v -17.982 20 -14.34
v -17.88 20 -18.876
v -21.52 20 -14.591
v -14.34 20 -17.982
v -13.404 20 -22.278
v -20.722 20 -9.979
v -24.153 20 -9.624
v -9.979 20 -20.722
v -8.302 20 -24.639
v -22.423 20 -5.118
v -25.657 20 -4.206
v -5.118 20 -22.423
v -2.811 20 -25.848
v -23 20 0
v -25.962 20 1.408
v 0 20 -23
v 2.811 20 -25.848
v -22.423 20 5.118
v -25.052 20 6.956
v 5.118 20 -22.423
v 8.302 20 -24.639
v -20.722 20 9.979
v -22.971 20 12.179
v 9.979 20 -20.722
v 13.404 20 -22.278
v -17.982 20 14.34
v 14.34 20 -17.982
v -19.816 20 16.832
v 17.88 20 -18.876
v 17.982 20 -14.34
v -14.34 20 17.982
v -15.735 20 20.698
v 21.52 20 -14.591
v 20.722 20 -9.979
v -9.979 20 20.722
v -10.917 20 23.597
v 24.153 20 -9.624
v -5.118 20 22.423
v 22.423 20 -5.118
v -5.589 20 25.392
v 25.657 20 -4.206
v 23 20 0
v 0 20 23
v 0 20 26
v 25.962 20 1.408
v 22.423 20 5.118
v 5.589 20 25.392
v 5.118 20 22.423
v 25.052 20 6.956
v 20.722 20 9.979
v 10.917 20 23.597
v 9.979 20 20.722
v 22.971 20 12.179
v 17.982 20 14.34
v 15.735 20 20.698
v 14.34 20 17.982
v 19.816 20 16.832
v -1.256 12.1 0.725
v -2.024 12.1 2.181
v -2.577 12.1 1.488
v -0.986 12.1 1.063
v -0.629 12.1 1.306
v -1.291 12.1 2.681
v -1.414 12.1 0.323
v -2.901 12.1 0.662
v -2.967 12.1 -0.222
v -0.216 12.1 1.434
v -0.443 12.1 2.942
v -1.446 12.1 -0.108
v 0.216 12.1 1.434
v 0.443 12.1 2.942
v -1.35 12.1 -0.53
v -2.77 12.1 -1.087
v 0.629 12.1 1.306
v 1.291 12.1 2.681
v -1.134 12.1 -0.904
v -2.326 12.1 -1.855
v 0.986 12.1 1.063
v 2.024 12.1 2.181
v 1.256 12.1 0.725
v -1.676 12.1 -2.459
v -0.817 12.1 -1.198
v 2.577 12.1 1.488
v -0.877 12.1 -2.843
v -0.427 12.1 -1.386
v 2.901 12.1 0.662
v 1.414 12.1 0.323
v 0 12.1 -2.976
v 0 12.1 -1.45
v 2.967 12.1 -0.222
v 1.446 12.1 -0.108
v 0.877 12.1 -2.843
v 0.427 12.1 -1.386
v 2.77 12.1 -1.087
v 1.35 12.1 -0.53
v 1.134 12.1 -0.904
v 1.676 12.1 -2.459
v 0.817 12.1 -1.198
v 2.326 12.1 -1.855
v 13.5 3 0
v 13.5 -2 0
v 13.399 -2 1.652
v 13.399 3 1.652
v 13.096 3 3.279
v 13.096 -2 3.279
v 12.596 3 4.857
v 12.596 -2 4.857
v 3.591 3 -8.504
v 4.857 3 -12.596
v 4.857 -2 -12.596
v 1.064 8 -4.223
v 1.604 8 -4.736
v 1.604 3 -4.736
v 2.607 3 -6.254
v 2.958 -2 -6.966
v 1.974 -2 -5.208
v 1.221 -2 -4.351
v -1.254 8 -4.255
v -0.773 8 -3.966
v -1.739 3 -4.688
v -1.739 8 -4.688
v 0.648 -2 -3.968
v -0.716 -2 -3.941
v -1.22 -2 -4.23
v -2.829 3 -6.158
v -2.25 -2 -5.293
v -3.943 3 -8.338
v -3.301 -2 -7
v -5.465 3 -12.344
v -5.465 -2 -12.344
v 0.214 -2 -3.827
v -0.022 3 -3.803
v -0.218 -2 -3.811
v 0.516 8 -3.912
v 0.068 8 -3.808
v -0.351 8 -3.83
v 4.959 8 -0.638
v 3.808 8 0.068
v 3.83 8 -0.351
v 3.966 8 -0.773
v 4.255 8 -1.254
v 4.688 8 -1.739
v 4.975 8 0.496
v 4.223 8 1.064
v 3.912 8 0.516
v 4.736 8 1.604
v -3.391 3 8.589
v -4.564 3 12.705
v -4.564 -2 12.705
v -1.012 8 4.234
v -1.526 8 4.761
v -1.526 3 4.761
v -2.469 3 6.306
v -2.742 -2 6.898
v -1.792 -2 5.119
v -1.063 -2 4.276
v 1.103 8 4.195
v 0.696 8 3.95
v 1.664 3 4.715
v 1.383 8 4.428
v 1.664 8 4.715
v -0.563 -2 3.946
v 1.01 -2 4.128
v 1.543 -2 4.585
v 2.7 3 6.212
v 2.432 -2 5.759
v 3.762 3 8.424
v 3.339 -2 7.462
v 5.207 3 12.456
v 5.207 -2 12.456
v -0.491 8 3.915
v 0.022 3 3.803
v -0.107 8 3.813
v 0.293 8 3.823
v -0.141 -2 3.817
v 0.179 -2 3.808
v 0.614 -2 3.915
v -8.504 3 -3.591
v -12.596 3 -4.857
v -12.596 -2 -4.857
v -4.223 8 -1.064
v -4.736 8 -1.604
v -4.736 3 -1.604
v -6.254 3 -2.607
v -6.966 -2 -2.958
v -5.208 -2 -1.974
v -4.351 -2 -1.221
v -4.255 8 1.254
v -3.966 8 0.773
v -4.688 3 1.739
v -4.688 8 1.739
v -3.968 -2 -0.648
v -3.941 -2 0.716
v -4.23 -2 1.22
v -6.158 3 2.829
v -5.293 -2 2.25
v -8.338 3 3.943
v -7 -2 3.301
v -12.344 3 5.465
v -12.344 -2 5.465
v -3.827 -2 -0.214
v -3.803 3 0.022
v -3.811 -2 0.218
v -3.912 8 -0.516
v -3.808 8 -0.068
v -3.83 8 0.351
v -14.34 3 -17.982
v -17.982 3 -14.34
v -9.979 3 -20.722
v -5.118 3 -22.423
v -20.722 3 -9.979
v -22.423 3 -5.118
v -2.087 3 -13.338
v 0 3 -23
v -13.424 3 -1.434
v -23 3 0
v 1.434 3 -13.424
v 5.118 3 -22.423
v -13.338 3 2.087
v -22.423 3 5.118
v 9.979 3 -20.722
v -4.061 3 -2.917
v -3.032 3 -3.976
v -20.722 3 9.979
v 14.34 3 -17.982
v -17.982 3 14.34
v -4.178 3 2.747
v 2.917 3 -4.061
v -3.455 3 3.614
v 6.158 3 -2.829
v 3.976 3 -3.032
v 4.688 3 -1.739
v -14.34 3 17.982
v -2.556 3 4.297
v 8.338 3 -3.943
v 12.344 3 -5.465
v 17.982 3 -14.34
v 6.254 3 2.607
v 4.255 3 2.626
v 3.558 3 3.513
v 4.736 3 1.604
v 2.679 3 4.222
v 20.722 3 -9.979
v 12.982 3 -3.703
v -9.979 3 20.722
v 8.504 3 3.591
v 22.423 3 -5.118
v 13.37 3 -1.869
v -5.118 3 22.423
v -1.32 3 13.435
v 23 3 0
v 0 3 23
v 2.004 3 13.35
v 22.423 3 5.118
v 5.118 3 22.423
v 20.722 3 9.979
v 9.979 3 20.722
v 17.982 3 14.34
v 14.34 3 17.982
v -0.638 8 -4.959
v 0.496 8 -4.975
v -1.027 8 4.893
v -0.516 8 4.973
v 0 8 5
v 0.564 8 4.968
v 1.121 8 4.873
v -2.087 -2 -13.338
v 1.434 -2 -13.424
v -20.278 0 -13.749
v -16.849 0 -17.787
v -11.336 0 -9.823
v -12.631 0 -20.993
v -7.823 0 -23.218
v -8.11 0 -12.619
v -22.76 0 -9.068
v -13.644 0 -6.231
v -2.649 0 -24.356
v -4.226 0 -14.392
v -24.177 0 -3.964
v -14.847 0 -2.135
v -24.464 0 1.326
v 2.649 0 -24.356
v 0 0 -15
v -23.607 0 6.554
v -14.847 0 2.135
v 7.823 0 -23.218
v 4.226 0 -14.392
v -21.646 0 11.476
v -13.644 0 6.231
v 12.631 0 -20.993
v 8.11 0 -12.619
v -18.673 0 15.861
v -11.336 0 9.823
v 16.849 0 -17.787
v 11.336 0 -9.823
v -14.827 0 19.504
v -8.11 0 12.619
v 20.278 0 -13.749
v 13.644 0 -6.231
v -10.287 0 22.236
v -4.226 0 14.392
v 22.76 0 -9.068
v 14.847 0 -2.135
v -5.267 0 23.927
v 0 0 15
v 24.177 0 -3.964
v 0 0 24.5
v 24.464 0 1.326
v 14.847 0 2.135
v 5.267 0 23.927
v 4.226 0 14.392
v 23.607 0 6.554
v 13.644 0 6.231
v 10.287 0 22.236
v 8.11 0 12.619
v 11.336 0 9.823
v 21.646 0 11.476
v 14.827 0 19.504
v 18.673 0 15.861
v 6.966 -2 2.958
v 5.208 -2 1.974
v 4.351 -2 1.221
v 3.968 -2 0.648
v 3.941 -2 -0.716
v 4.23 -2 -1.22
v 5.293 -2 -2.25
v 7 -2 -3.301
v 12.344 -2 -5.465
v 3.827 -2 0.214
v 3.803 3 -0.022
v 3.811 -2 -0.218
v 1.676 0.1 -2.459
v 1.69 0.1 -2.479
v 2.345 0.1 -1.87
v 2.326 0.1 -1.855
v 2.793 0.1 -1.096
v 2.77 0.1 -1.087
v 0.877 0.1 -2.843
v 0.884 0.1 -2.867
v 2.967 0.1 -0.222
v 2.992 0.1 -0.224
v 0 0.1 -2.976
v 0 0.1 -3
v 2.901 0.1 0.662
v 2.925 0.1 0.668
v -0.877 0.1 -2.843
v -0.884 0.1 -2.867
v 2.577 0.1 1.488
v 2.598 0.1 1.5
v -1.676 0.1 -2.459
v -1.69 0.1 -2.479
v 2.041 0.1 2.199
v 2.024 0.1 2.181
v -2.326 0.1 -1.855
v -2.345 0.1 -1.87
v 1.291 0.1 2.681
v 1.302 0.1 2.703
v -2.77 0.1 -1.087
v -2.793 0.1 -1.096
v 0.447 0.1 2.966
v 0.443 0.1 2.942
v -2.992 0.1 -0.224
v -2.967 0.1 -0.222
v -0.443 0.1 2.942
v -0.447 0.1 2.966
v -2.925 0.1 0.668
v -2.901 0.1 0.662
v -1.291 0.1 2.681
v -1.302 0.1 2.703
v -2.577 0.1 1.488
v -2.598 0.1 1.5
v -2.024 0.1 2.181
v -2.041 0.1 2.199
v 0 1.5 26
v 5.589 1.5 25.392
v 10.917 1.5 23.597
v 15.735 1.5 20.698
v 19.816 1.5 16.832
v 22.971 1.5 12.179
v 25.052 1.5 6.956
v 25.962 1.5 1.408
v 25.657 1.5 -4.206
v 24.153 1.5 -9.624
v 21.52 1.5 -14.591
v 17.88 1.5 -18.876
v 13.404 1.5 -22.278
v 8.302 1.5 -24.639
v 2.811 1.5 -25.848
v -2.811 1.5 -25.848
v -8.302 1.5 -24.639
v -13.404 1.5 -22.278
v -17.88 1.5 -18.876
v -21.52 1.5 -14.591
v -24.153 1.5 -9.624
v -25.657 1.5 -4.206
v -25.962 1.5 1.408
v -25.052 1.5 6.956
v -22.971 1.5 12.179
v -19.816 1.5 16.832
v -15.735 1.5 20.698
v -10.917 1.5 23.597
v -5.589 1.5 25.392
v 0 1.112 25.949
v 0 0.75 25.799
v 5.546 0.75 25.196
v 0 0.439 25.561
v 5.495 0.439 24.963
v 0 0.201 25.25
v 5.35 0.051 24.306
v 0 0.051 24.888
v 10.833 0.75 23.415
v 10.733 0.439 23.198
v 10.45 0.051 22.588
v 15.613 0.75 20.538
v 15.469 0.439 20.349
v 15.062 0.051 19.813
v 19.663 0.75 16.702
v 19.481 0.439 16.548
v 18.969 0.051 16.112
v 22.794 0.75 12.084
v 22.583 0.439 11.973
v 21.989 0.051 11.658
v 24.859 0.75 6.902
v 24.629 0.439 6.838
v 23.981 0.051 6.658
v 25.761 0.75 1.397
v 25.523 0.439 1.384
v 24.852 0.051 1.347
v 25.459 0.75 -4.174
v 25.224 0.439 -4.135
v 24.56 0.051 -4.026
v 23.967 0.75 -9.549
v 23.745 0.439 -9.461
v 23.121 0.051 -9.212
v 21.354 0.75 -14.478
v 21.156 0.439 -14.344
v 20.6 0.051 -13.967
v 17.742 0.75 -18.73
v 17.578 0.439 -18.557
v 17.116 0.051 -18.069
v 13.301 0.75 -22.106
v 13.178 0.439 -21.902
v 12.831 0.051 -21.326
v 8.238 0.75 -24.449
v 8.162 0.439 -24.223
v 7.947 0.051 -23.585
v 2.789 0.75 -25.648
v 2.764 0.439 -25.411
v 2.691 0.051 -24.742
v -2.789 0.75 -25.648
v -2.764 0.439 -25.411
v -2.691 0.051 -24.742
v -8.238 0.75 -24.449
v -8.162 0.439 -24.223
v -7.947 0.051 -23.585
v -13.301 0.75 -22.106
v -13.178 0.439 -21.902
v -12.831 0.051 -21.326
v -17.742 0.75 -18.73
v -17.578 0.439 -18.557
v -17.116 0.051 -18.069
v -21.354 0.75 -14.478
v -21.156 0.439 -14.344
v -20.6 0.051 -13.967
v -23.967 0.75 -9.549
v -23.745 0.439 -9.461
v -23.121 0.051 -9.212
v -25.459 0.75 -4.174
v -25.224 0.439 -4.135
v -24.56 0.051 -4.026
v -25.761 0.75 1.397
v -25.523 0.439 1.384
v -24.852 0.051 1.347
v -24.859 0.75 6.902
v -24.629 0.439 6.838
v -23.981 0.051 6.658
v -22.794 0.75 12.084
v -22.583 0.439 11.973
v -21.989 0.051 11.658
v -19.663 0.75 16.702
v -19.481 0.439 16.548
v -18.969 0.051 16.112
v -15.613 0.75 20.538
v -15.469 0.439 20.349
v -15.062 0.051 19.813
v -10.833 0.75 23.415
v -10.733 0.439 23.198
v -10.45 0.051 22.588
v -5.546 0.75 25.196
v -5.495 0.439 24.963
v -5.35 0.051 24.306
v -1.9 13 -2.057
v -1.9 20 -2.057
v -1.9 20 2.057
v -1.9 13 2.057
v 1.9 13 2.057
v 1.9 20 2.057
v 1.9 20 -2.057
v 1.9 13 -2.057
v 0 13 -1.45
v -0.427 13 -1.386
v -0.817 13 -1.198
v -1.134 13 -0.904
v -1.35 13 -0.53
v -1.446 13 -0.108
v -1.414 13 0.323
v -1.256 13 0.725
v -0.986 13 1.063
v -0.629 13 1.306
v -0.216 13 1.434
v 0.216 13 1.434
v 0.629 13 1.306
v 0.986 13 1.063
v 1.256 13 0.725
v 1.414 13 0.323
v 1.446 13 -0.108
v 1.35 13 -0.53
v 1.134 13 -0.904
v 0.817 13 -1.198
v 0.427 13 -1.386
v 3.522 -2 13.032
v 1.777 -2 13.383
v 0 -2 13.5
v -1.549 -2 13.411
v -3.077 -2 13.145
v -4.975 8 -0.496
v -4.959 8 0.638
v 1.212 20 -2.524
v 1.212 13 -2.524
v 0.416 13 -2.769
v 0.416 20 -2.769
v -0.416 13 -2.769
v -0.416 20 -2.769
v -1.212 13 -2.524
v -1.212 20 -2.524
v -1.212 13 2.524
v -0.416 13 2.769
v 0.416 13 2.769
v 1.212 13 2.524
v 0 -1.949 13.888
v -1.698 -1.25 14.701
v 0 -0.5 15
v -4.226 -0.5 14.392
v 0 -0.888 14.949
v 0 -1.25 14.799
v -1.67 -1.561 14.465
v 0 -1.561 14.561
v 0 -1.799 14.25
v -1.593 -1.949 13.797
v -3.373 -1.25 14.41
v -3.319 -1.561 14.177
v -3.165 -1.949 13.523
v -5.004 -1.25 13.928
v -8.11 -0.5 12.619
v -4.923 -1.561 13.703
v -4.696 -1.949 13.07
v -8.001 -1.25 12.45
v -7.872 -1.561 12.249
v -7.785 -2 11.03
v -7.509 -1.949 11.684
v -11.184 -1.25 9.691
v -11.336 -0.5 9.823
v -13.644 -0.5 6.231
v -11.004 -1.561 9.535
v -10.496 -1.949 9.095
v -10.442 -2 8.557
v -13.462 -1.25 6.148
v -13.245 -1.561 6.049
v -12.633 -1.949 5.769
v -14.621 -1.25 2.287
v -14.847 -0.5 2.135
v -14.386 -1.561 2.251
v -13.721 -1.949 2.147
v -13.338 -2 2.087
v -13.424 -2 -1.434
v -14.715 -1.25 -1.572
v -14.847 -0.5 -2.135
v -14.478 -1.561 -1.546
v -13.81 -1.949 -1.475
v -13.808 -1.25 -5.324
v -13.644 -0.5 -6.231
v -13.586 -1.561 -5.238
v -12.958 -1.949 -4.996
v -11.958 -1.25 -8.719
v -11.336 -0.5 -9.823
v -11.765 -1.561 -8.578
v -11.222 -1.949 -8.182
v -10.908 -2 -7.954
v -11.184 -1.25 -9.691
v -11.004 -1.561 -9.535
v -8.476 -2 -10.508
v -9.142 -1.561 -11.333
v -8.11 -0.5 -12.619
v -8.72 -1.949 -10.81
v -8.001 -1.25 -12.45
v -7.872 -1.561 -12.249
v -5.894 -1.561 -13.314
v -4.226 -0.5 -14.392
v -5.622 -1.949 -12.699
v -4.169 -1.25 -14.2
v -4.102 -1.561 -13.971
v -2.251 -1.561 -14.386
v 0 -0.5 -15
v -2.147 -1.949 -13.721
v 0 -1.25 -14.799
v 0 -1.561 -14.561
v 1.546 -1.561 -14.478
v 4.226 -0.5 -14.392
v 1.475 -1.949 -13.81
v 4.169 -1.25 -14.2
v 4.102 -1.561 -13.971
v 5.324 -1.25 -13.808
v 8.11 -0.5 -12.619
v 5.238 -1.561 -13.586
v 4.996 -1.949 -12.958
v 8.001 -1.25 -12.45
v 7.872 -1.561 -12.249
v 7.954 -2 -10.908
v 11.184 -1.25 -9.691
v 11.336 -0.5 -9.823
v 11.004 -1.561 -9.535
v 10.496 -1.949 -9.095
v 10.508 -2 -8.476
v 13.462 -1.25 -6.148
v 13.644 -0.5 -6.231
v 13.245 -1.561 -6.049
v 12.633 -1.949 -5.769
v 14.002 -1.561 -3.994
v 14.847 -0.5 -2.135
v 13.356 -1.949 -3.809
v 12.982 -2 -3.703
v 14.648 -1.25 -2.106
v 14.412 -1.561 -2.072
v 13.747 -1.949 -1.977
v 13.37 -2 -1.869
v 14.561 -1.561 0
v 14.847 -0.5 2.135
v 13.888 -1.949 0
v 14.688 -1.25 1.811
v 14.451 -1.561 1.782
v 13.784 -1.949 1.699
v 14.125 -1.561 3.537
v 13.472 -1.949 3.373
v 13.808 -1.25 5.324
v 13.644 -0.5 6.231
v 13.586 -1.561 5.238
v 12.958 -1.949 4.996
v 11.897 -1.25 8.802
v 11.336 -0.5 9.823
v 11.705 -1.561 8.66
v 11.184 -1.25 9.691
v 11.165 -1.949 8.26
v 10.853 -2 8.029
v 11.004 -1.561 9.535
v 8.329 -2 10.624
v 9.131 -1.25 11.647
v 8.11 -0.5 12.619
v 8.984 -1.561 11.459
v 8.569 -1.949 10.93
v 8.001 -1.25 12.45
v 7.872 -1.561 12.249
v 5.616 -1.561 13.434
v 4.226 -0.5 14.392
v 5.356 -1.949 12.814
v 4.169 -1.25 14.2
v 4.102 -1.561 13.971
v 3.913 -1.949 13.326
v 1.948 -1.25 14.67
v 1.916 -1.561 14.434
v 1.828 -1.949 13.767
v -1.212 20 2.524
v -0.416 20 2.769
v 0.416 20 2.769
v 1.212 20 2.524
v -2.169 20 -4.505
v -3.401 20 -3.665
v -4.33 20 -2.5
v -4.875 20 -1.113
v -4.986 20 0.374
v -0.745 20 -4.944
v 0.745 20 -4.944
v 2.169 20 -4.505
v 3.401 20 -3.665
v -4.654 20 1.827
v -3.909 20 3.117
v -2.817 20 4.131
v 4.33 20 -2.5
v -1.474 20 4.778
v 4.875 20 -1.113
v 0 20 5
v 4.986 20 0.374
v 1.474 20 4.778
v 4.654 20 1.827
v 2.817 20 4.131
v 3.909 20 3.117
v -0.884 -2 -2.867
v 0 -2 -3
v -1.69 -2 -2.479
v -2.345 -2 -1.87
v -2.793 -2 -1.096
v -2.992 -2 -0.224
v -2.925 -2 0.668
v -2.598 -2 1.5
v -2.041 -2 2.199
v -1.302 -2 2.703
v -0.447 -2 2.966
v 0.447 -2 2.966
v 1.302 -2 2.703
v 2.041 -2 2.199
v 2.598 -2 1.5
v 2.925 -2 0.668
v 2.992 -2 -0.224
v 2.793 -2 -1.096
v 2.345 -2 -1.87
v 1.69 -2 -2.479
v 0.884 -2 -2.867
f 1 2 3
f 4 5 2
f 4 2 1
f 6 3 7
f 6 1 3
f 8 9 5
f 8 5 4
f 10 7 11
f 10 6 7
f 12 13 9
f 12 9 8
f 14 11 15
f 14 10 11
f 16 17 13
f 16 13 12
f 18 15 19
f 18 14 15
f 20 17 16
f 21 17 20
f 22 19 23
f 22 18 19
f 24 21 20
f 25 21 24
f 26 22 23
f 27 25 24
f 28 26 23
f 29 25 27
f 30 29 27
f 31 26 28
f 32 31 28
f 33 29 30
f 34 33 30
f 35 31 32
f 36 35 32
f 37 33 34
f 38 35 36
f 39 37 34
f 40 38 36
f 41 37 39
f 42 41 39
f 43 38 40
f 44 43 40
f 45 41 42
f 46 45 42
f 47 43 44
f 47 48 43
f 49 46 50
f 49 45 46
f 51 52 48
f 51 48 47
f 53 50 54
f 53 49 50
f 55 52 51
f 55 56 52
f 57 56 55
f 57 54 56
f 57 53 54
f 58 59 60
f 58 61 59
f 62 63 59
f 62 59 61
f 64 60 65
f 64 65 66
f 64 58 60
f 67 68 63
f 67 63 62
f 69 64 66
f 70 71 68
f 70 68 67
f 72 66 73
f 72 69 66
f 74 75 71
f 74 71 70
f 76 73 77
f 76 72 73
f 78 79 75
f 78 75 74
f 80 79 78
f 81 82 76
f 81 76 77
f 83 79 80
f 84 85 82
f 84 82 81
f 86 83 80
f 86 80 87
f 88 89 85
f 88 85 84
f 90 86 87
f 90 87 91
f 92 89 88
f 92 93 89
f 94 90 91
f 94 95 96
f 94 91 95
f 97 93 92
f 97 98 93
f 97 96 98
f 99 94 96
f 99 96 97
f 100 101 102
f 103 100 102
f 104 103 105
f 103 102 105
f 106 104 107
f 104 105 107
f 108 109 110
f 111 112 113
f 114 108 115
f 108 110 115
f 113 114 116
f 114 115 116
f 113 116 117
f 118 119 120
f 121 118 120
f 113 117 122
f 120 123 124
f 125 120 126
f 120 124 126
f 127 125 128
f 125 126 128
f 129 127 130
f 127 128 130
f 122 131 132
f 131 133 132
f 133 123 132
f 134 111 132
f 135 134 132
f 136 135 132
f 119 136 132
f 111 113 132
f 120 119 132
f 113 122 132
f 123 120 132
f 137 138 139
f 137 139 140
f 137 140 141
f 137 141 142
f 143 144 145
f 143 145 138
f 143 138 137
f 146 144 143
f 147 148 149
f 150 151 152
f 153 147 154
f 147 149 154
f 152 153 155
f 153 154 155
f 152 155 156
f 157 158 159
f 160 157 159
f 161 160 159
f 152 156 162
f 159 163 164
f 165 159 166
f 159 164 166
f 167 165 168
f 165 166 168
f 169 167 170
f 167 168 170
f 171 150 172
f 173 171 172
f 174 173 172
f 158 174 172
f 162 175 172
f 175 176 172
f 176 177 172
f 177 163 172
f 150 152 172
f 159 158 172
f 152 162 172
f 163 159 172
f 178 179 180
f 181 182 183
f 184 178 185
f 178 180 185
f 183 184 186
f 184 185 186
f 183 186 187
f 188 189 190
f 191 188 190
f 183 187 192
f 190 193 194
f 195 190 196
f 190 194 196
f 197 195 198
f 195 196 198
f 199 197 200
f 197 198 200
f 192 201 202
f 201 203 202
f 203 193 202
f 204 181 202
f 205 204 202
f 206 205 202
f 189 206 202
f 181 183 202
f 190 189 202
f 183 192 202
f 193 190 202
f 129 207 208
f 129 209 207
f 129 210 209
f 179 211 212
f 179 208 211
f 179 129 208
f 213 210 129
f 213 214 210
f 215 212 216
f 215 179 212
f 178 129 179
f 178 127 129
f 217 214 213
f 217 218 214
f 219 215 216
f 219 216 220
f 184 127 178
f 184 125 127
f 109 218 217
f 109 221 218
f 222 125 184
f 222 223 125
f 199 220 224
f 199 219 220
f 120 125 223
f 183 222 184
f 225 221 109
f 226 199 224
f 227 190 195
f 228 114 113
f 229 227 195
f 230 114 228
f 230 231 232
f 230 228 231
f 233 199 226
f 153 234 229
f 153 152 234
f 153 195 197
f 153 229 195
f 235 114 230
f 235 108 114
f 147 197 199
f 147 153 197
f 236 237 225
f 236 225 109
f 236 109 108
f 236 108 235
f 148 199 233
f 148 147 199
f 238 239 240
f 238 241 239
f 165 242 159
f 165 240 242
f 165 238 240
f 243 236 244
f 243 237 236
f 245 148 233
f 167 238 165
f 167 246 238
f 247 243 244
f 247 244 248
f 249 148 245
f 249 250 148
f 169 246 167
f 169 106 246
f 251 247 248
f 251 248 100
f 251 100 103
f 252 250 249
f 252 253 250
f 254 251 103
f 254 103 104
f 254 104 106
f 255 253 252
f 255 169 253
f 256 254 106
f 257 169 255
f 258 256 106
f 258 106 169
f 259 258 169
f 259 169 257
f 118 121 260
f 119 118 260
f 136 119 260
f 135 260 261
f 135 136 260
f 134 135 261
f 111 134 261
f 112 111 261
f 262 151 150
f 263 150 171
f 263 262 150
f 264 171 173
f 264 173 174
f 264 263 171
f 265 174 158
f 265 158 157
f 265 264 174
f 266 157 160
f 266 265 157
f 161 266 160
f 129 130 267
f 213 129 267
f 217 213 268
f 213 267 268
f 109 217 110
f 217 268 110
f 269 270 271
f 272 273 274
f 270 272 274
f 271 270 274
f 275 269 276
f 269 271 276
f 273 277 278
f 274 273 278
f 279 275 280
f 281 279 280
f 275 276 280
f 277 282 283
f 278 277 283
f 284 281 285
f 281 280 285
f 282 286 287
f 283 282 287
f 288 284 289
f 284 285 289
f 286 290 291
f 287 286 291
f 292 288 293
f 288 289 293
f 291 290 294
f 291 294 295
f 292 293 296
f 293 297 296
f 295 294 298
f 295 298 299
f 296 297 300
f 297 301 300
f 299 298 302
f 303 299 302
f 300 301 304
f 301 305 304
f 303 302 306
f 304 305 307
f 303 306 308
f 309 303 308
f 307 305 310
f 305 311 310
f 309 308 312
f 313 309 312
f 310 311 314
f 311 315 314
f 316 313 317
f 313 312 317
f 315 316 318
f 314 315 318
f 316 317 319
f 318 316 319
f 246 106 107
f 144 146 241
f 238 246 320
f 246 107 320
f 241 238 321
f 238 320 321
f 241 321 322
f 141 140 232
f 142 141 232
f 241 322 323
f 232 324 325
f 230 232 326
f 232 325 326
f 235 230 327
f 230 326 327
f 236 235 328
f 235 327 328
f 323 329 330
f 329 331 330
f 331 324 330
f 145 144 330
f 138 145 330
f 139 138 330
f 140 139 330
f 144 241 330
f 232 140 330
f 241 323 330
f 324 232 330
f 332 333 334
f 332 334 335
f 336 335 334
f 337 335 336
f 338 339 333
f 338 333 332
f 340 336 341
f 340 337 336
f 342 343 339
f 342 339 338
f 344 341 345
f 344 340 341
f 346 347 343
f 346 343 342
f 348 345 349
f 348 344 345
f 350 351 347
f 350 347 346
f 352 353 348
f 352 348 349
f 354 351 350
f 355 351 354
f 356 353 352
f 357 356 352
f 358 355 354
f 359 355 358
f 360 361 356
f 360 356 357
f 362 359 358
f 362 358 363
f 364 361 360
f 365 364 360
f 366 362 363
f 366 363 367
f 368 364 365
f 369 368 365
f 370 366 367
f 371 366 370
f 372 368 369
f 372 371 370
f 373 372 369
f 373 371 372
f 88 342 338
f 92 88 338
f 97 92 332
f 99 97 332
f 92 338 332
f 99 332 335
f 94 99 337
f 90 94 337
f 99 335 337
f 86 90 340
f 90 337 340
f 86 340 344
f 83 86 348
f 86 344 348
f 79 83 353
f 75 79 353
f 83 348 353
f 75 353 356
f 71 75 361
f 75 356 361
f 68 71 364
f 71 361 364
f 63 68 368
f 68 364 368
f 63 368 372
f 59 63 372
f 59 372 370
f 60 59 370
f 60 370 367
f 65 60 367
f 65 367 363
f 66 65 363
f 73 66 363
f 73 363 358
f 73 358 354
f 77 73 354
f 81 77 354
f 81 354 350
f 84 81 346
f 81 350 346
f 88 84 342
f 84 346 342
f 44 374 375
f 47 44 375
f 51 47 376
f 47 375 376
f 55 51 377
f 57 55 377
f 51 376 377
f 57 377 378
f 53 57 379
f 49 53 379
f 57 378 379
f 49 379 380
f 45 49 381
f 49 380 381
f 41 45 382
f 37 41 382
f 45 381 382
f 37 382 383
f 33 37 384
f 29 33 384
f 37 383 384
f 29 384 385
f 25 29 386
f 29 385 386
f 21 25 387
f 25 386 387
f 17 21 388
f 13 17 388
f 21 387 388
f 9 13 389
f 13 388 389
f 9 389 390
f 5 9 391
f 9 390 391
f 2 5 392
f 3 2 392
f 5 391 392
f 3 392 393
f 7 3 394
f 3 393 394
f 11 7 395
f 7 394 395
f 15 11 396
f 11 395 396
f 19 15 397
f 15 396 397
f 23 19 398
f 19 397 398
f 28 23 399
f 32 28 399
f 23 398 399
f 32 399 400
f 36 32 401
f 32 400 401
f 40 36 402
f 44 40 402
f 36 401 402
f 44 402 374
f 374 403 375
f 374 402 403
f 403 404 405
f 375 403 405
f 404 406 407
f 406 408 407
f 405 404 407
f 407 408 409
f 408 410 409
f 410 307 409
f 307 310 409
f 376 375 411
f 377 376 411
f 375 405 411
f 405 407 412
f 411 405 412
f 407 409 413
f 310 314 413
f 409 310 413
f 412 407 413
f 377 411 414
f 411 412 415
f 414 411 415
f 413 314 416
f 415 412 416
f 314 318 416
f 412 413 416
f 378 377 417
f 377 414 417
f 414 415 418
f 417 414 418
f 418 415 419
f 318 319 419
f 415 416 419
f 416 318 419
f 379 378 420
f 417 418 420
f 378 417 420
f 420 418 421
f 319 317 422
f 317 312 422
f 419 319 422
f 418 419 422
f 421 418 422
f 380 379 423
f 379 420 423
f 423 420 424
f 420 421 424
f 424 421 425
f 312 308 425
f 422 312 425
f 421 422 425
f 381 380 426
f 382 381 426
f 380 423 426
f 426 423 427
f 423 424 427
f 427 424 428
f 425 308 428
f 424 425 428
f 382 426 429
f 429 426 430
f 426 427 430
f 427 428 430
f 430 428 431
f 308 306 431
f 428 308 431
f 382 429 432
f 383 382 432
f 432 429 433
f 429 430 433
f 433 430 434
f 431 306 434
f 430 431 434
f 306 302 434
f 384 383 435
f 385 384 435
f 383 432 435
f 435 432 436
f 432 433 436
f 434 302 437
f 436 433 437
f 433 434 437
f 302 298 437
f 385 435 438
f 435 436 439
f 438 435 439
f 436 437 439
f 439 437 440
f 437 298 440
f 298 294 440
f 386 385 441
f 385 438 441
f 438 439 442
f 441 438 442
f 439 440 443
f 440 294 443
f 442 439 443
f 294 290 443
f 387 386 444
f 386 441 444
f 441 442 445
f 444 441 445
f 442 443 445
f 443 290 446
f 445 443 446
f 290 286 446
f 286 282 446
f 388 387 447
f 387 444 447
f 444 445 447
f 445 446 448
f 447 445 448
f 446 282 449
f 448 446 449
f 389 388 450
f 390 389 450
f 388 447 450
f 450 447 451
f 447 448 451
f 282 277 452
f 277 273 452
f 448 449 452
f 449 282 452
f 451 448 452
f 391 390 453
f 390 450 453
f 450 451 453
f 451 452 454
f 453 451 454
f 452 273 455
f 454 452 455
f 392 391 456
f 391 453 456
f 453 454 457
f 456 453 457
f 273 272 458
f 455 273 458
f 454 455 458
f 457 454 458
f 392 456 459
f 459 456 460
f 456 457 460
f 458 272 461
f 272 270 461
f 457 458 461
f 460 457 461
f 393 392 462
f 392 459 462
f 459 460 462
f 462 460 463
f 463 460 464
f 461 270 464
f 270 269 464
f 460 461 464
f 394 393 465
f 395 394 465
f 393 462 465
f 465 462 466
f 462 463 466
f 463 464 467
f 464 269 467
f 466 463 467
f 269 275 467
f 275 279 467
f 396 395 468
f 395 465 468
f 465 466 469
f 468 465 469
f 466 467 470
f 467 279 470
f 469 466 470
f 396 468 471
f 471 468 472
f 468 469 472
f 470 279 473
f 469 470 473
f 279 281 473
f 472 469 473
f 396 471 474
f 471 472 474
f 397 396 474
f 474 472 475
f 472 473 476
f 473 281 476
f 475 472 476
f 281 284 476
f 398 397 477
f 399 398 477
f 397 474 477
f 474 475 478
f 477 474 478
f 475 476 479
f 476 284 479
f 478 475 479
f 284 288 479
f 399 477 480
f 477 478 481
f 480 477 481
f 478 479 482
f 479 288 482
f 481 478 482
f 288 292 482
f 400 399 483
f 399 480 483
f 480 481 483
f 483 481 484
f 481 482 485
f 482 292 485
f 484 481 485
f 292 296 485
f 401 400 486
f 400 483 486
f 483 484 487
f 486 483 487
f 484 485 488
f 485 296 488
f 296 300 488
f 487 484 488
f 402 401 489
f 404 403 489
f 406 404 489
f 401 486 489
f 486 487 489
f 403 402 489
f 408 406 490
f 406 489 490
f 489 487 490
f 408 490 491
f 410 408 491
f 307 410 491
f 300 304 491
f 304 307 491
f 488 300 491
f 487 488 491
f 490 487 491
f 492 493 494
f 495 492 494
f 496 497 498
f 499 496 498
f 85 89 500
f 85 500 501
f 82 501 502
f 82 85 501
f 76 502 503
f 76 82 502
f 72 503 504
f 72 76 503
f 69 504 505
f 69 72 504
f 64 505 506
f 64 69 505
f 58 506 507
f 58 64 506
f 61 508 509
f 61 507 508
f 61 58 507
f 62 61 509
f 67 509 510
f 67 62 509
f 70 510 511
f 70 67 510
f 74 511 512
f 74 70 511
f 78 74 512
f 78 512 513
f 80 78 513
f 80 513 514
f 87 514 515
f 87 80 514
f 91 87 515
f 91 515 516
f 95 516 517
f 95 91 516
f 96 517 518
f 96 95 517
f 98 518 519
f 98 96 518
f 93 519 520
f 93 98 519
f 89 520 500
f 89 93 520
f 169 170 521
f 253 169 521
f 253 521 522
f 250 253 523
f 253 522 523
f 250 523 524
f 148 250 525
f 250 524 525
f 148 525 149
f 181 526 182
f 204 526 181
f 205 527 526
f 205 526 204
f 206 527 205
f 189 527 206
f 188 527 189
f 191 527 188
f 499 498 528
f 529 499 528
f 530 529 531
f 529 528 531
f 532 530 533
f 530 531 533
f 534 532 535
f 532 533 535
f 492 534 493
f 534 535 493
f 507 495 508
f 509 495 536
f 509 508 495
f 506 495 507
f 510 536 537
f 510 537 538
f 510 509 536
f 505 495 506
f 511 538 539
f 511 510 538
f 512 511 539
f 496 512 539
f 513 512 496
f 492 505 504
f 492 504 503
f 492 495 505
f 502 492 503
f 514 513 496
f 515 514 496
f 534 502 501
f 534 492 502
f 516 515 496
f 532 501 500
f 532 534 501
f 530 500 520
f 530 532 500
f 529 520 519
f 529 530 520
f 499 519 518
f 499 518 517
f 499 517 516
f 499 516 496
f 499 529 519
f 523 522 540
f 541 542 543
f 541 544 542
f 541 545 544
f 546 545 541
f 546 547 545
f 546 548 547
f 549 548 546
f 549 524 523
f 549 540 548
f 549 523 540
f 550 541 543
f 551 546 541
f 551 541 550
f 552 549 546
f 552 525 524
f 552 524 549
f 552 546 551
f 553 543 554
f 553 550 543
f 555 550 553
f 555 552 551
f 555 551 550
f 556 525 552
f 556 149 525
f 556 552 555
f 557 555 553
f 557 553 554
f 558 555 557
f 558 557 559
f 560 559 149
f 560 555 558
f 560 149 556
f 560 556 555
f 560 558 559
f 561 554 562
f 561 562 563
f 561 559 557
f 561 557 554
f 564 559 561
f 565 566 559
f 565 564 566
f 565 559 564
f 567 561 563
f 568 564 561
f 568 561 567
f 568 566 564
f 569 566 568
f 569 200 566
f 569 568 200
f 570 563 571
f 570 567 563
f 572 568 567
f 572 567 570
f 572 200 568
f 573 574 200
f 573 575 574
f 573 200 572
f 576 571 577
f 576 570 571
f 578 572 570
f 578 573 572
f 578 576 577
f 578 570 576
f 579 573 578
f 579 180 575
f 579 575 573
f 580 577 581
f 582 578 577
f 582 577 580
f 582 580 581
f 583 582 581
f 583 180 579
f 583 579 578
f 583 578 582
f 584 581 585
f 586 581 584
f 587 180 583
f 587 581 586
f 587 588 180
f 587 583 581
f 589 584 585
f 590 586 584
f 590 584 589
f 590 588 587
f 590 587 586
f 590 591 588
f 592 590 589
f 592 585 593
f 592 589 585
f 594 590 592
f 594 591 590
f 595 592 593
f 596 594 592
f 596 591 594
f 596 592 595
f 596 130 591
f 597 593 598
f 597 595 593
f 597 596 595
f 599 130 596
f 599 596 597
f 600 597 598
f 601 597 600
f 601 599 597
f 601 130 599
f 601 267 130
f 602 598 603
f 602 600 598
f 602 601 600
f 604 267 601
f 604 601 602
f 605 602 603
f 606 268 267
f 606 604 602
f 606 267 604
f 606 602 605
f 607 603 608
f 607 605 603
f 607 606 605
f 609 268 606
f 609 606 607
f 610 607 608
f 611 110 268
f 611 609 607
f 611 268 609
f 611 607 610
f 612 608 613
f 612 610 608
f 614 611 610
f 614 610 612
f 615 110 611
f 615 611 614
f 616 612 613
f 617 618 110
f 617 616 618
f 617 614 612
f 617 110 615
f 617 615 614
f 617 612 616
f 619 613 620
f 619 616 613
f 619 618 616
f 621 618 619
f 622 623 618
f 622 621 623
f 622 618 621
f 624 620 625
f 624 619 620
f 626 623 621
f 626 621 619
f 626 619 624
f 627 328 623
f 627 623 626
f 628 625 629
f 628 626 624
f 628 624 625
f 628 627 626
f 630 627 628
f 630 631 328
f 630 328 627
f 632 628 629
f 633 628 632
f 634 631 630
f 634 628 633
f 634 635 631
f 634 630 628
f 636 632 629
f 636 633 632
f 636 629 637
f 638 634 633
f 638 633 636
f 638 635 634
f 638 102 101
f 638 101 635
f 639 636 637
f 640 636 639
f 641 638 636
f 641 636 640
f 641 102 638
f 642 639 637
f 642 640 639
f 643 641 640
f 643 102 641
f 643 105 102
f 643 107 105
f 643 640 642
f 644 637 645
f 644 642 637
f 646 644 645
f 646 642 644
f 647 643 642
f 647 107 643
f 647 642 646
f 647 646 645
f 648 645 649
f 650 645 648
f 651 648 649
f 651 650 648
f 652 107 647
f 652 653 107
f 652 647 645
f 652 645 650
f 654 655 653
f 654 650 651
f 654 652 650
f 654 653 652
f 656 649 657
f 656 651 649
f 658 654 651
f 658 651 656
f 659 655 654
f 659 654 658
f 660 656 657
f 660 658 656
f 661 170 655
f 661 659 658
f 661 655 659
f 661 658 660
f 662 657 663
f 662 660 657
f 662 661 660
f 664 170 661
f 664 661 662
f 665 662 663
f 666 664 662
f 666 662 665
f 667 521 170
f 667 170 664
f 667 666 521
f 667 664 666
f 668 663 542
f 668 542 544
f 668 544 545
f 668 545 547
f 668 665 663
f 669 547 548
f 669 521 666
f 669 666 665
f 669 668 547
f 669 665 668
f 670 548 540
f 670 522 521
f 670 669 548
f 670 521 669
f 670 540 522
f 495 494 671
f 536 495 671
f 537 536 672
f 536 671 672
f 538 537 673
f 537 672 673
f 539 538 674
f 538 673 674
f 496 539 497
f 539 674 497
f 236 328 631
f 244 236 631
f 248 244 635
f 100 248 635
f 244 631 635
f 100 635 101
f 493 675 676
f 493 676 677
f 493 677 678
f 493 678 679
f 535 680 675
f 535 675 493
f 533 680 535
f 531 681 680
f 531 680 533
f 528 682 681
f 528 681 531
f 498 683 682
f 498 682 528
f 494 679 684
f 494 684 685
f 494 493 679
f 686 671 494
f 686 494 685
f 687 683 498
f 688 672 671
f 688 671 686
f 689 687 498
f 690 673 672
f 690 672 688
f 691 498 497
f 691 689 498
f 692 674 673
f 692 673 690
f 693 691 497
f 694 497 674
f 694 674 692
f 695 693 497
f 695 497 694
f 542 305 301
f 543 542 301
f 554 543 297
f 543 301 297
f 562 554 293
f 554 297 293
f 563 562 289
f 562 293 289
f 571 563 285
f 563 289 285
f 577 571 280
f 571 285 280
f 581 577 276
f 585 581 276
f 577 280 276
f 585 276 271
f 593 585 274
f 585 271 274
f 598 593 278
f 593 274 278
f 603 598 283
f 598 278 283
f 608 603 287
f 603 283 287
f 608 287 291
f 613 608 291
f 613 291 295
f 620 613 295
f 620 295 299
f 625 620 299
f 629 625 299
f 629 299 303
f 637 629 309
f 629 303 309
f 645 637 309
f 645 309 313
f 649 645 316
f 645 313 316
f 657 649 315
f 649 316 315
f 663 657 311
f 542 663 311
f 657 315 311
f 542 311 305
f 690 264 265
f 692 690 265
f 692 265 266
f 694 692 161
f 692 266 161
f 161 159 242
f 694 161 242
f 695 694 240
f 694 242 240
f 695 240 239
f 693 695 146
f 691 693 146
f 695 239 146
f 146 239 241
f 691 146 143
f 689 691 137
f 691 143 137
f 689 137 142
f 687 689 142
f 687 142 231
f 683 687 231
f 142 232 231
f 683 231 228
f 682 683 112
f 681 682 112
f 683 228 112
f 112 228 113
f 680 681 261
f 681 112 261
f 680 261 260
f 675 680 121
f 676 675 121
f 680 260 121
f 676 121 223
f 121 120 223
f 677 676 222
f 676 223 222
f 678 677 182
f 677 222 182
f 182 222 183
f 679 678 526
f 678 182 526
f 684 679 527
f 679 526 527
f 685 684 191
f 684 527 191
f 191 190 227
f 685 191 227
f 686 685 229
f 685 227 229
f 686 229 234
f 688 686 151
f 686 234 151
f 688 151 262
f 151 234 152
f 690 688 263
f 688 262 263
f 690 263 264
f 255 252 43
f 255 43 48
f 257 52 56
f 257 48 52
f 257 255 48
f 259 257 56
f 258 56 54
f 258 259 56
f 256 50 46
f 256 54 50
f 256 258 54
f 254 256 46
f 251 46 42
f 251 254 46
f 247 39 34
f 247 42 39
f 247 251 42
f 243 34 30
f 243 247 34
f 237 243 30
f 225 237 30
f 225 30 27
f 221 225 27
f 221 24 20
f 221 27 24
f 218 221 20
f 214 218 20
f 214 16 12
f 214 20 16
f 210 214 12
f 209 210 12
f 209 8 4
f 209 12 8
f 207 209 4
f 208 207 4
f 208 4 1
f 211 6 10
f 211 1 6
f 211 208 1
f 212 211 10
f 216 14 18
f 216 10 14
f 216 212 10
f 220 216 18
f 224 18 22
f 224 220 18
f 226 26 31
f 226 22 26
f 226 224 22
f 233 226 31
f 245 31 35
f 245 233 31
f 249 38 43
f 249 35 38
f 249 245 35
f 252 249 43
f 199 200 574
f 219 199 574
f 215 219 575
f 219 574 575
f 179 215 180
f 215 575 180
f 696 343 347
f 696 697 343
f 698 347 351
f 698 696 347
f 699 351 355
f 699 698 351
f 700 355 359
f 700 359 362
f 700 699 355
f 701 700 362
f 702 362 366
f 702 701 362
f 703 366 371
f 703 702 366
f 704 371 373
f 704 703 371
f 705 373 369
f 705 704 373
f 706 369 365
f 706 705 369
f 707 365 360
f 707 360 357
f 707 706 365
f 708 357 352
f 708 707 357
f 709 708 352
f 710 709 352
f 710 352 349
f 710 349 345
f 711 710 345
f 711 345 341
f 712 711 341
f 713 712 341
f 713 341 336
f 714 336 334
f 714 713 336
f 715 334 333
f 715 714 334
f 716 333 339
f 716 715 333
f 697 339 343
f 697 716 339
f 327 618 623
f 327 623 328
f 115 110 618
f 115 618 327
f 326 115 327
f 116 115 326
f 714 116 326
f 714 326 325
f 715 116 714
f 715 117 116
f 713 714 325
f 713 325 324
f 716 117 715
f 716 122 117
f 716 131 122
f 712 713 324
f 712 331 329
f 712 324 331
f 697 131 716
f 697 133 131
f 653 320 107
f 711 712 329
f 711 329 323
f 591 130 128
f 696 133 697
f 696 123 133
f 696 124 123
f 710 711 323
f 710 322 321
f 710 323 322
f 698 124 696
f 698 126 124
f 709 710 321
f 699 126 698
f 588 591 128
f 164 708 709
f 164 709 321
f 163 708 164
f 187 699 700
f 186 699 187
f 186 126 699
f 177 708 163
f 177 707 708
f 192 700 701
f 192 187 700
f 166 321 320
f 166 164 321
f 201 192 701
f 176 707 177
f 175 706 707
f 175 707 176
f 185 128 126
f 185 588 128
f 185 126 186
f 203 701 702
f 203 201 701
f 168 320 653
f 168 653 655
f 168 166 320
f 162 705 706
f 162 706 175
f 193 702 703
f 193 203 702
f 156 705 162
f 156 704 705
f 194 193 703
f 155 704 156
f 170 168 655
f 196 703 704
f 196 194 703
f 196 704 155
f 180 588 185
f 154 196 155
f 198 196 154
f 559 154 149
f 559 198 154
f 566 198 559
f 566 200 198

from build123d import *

# Parameters (mm, degrees)
CROQUIS1_R              = 26
SALIENTE_EXTRUIR1_DEPTH = 20
VACIADO1_T              = -3
REDONDEO1_R             = 1.5
CROQUIS2_R              = 15
SALIENTE_EXTRUIR2_DEPTH = 2
REDONDEO2_R             = 1.5
CROQUIS5_R              = 5
SALIENTE_EXTRUIR3_DEPTH = 17
CORTAR_EXTRUIR3_DEPTH   = 7
CORTAR_EXTRUIR5_DEPTH   = 10
CROQUIS12_R             = 2.975585662
CORTAR_EXTRUIR4_DEPTH   = 12


with BuildPart() as part:
    # Croquis1 → Saliente-Extruir1 (new body)
    with BuildSketch(Plane(origin=(0, 0, 0), x_dir=(1, 0, 0), z_dir=(0, 1, 0))):
        with Locations(Location((0, 0, 0), (0, 0, 270))):
            Circle(CROQUIS1_R)
    extrude(amount=SALIENTE_EXTRUIR1_DEPTH)

    # Vaciado1
    vaciado1_openings = [part.faces().sort_by_distance(p)[0] for p in [
        (0, 20, 0),
    ]]
    offset(amount=VACIADO1_T, openings=vaciado1_openings, kind=Kind.INTERSECTION)

    # Redondeo1
    redondeo1_edges = [part.edges().sort_by_distance(p)[0] for p in [
        (0, 0, -26),
    ]]
    fillet(redondeo1_edges, radius=REDONDEO1_R)

    # Croquis2 → Saliente-Extruir2 (add)
    with BuildSketch(Plane.XZ):
        with Locations(Location((0, 0, 0), (0, 0, 90))):
            Circle(CROQUIS2_R)
    extrude(amount=SALIENTE_EXTRUIR2_DEPTH)

    # Redondeo2
    redondeo2_edges = [part.edges().sort_by_distance(p)[0] for p in [
        (0, -2, -15),
    ]]
    fillet(redondeo2_edges, radius=REDONDEO2_R)

    # Croquis5 → Saliente-Extruir3 (add)
    with BuildSketch(Plane(origin=(0, 3, 0), x_dir=(1, 0, 0), z_dir=(0, 1, 0))):
        with Locations(Location((0, 0, 0), (0, 0, 270))):
            Circle(CROQUIS5_R)
    extrude(amount=SALIENTE_EXTRUIR3_DEPTH)

    # Croquis6 → Cortar-Extruir3 (cut)
    with BuildSketch(Plane(origin=(0, 20, 0), x_dir=(1, 0, 0), z_dir=(0, 1, 0))):
        with BuildLine():
            ThreePointArc((1.9, 2.05669638), (0, 2.8), (-1.9, 2.05669638))
            Line((-1.9, 2.05669638), (-1.9, -2.05669638))
            ThreePointArc((-1.9, -2.05669638), (0, -2.8), (1.9, -2.05669638))
            Line((1.9, -2.05669638), (1.9, 2.05669638))
        make_face()
    extrude(amount=-CORTAR_EXTRUIR3_DEPTH, mode=Mode.SUBTRACT)

    # Croquis10 → Refrentado para tornillo con cabeza troncocónica de M2.51 (revolve, cut)
    with BuildSketch(Plane(origin=(0, -2, 0), x_dir=(0, 0, -1), z_dir=(1, 0, 0))):
        Polygon((0, 0), (0, 22), (1.45, 22), (1.45, 2.1), (3, 2.1), (3, 0), align=None)
    revolve(axis=Axis((0, -8.35, 0), (0, 1, 0)), mode=Mode.SUBTRACT)

    # Croquis4 → Cortar-Extruir5 (cut)
    with BuildSketch(Plane.XZ.offset(2)):
        with BuildLine():
            ThreePointArc((-5.465091238, -12.344341933), (-0.32920888, -13.495985385), (4.856716063, -12.59612278))
            add(Edge.make_bspline(
                [(4.856716063, -12.59612278), (0.260062293, 4.863404328), (-5.465091238, -12.344341933)],
                knots=[0.092611361, 0.092611361, 0.092611361, 0.907859472, 0.907859472, 0.907859472], degree=2))
        make_face()
        with BuildLine():
            add(Edge.make_bspline(
                [(-12.59612278, -4.856716063), (4.863404328, -0.260062293), (-12.344341933, 5.465091238)],
                knots=[0.092611361, 0.092611361, 0.092611361, 0.907859472, 0.907859472, 0.907859472], degree=2))
            ThreePointArc((-12.344341933, 5.465091238), (-13.495985385, 0.32920888), (-12.59612278, -4.856716063))
        make_face()
        with BuildLine():
            add(Edge.make_bspline(
                [(-4.564383108, 12.704975673), (-0.276925472, -4.973532137), (5.206643951, 12.455555338)],
                knots=[0.037040057, 0.037040057, 0.037040057, 0.963168016, 0.963168016, 0.963168016], degree=2))
            ThreePointArc((5.206643951, 12.455555338), (0.344495825, 13.495603826), (-4.564383108, 12.704975673))
        make_face()
        with BuildLine():
            ThreePointArc((13.5, 0), (13.272107171, 2.470054906), (12.59612278, 4.856716063))
            add(Edge.make_bspline(
                [(12.59612278, 4.856716063), (-4.863404328, 0.260062293), (12.344341933, -5.465091238)],
                knots=[0.092611361, 0.092611361, 0.092611361, 0.907859472, 0.907859472, 0.907859472], degree=2))
            ThreePointArc((12.344341933, -5.465091238), (13.207925956, -2.792971885), (13.5, 0))
        make_face()
    extrude(amount=-CORTAR_EXTRUIR5_DEPTH, mode=Mode.SUBTRACT)

    # Croquis12 → Cortar-Extruir4 (cut)
    with BuildSketch(Plane.XZ.offset(-0.1)):
        with Locations(Location((0, 0, 0), (0, 0, 270))):
            Circle(CROQUIS12_R)
    extrude(amount=-CORTAR_EXTRUIR4_DEPTH, mode=Mode.SUBTRACT)


solid = part.part
